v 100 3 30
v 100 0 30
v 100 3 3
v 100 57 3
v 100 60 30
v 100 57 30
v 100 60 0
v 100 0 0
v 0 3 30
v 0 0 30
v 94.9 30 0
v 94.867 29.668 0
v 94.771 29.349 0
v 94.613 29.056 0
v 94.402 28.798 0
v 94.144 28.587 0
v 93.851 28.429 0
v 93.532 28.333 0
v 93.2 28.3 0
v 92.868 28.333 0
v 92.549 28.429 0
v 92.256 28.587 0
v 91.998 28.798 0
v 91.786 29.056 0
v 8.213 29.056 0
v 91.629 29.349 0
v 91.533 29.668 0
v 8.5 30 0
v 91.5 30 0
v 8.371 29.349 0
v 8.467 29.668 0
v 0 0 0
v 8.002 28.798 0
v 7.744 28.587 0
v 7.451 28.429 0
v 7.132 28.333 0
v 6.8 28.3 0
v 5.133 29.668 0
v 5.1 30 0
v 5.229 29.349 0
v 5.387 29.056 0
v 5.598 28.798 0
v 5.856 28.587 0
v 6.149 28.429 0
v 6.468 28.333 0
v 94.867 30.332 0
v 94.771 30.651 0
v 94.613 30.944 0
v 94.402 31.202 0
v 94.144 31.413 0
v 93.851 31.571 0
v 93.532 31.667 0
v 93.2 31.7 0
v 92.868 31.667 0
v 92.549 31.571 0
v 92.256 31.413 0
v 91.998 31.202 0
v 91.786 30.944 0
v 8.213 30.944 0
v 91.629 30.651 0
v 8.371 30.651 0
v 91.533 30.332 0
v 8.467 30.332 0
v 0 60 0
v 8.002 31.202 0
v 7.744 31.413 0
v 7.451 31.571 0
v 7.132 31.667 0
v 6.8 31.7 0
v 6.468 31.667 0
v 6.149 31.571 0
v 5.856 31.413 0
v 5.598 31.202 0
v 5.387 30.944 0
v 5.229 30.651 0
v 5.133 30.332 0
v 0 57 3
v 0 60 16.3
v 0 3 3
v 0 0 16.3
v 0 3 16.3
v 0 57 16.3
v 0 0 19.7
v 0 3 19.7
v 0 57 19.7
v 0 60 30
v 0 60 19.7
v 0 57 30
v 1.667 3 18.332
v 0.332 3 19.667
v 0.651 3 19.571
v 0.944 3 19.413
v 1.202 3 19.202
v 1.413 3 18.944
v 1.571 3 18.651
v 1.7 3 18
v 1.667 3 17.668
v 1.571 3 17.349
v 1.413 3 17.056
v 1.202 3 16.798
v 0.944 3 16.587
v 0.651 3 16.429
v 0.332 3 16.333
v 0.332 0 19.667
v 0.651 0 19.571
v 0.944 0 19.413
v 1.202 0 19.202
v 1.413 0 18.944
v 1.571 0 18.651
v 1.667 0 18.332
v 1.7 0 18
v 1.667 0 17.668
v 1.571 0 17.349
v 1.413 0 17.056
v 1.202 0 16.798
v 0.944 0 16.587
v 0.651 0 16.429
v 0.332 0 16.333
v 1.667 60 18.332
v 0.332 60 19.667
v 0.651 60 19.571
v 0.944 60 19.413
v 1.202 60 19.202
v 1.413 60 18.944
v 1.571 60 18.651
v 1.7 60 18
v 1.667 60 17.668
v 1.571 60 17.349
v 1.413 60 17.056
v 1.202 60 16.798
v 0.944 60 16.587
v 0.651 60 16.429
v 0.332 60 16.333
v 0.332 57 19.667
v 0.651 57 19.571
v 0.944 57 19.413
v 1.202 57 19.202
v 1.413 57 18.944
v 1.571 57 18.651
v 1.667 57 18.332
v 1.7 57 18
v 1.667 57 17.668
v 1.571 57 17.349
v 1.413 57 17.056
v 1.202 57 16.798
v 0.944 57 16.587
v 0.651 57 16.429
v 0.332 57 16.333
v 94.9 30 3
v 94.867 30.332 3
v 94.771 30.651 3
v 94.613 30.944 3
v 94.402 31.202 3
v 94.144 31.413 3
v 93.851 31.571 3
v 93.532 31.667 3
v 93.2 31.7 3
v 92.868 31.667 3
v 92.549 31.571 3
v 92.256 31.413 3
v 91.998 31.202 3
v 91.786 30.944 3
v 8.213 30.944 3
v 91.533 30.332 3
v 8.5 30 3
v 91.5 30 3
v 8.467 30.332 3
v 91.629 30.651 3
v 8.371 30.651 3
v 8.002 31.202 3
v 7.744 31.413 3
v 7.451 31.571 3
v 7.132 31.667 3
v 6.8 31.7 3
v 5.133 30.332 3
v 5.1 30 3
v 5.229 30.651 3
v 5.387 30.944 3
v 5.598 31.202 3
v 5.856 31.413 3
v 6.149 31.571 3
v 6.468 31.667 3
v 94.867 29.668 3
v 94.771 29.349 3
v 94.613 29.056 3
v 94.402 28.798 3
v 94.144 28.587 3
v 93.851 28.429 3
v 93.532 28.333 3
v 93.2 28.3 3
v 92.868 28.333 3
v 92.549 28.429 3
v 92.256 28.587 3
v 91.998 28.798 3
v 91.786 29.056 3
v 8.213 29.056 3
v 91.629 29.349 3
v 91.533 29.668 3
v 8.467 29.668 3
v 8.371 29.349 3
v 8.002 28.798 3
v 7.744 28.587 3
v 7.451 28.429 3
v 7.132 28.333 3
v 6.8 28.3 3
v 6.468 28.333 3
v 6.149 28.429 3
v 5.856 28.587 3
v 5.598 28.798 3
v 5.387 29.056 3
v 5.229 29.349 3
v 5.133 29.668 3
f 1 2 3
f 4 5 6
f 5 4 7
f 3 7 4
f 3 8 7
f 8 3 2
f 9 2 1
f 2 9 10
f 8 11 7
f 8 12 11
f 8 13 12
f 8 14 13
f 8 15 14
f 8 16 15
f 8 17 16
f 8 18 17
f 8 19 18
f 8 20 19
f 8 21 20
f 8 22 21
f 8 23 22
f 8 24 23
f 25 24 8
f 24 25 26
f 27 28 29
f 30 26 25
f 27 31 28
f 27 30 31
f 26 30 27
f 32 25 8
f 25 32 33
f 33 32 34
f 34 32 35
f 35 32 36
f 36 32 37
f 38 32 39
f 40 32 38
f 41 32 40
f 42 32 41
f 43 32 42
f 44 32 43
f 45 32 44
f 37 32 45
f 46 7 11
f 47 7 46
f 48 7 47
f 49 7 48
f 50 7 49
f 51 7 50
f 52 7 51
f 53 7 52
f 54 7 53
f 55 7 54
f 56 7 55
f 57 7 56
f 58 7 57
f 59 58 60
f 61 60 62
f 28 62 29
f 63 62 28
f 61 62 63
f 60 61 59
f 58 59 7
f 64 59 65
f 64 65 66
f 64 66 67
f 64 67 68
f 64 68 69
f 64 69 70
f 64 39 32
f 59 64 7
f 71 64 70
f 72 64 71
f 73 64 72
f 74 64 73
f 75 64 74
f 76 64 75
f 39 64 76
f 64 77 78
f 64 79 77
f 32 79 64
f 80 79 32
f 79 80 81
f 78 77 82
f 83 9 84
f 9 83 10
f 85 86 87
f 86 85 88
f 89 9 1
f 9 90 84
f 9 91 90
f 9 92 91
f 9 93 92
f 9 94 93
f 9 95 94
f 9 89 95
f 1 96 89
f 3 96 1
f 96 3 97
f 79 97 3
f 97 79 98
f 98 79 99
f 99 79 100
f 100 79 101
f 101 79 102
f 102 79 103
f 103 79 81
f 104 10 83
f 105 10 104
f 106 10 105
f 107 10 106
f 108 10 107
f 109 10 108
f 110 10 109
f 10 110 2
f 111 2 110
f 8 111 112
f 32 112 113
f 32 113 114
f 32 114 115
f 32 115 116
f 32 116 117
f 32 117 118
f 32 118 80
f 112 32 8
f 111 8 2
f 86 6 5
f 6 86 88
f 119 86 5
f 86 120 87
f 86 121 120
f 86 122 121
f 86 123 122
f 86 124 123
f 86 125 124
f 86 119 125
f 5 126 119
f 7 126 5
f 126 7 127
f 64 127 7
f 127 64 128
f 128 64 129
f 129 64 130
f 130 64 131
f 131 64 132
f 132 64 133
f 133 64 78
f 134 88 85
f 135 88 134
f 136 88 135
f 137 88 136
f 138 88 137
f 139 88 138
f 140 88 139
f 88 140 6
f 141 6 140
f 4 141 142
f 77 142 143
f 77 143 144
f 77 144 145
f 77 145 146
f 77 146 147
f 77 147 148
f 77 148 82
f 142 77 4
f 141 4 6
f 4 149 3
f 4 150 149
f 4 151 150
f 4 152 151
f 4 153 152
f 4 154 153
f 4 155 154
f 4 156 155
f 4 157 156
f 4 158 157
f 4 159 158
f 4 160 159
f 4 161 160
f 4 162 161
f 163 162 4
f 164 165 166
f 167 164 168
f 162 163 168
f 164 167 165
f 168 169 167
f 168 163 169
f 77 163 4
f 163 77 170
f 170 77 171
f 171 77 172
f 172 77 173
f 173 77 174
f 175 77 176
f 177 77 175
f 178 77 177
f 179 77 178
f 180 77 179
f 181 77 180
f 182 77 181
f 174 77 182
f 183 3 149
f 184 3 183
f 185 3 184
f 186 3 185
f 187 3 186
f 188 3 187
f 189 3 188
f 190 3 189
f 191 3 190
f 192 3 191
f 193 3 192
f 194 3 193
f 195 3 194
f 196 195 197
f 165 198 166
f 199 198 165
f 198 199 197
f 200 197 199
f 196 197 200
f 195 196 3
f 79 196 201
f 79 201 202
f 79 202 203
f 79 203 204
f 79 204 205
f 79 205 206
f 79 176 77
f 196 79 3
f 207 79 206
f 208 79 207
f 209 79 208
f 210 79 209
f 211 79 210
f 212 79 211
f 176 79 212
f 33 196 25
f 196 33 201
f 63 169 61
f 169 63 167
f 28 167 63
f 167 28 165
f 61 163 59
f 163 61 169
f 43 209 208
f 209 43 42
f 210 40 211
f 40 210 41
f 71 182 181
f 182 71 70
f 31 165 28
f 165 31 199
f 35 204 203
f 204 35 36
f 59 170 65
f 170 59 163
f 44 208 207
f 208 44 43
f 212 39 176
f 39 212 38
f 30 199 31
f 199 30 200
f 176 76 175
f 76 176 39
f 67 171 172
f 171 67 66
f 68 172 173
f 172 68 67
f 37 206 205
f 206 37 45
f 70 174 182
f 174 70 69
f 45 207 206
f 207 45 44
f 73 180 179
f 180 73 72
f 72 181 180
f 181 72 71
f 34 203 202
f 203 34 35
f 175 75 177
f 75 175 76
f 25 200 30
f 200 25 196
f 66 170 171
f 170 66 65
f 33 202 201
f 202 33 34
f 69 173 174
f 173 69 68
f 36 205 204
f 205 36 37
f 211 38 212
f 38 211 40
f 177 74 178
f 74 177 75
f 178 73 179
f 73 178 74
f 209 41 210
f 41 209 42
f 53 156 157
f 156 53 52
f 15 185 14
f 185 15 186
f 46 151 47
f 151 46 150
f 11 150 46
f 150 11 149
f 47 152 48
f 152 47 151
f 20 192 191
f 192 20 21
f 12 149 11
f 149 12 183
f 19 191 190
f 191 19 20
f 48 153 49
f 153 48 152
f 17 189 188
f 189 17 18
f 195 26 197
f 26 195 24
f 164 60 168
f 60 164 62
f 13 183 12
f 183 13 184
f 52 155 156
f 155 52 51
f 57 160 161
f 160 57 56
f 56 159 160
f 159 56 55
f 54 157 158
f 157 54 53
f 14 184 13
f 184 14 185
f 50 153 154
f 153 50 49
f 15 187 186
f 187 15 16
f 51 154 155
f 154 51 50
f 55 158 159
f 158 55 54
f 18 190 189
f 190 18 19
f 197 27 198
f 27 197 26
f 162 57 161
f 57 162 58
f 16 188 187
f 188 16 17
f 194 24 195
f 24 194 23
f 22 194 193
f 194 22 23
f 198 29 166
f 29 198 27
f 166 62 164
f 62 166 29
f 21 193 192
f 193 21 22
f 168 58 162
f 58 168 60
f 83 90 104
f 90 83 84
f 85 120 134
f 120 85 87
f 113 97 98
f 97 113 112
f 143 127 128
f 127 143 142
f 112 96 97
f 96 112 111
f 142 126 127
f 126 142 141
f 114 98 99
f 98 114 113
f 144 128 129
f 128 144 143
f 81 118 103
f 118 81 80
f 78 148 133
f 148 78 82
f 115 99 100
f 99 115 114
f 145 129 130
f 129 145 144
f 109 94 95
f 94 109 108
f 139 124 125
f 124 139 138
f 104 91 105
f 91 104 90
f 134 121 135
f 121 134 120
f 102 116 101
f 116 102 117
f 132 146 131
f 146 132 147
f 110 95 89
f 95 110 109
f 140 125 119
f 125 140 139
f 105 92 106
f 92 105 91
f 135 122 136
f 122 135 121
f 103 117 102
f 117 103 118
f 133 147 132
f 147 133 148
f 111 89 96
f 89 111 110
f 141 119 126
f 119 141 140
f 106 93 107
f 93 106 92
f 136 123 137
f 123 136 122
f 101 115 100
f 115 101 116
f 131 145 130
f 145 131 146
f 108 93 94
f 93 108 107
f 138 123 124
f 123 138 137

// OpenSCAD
$fn = 32;

// ----------------------------------------------------------------------
// U-bracket: 100 x 60 x 30 mm
// ----------------------------------------------------------------------

// --- parameters (mm) ---
rail_len = 100;           // outer length, X
jaw_w = 60;               // outer width, Y
jaw_h = 30;               // upright height, Z
web_t = 3;                // wall thickness
hole_d = 3.4;             // clearance for M3

module hole_z(px, py) {
  translate([px, py, -2.5]) cylinder(h = web_t + 5, d = hole_d);
}
module hole_y_pz(pz) {
  /* through both uprights along Y */
  translate([0, -2.5, pz]) rotate([-90, 0, 0]) cylinder(h = jaw_w + 5, d = hole_d);
}

module base() {
  cube([rail_len, jaw_w, web_t]);
}

module uprights() {
  cube([rail_len, web_t, jaw_h]);
  translate([0, jaw_w - web_t, 0]) cube([rail_len, web_t, jaw_h]);
}

difference() {
  union() {
    base();
    uprights();
  }
  hole_z(6.8, 30);
  hole_z(93.2, 30);
  hole_y_pz(18);
}
